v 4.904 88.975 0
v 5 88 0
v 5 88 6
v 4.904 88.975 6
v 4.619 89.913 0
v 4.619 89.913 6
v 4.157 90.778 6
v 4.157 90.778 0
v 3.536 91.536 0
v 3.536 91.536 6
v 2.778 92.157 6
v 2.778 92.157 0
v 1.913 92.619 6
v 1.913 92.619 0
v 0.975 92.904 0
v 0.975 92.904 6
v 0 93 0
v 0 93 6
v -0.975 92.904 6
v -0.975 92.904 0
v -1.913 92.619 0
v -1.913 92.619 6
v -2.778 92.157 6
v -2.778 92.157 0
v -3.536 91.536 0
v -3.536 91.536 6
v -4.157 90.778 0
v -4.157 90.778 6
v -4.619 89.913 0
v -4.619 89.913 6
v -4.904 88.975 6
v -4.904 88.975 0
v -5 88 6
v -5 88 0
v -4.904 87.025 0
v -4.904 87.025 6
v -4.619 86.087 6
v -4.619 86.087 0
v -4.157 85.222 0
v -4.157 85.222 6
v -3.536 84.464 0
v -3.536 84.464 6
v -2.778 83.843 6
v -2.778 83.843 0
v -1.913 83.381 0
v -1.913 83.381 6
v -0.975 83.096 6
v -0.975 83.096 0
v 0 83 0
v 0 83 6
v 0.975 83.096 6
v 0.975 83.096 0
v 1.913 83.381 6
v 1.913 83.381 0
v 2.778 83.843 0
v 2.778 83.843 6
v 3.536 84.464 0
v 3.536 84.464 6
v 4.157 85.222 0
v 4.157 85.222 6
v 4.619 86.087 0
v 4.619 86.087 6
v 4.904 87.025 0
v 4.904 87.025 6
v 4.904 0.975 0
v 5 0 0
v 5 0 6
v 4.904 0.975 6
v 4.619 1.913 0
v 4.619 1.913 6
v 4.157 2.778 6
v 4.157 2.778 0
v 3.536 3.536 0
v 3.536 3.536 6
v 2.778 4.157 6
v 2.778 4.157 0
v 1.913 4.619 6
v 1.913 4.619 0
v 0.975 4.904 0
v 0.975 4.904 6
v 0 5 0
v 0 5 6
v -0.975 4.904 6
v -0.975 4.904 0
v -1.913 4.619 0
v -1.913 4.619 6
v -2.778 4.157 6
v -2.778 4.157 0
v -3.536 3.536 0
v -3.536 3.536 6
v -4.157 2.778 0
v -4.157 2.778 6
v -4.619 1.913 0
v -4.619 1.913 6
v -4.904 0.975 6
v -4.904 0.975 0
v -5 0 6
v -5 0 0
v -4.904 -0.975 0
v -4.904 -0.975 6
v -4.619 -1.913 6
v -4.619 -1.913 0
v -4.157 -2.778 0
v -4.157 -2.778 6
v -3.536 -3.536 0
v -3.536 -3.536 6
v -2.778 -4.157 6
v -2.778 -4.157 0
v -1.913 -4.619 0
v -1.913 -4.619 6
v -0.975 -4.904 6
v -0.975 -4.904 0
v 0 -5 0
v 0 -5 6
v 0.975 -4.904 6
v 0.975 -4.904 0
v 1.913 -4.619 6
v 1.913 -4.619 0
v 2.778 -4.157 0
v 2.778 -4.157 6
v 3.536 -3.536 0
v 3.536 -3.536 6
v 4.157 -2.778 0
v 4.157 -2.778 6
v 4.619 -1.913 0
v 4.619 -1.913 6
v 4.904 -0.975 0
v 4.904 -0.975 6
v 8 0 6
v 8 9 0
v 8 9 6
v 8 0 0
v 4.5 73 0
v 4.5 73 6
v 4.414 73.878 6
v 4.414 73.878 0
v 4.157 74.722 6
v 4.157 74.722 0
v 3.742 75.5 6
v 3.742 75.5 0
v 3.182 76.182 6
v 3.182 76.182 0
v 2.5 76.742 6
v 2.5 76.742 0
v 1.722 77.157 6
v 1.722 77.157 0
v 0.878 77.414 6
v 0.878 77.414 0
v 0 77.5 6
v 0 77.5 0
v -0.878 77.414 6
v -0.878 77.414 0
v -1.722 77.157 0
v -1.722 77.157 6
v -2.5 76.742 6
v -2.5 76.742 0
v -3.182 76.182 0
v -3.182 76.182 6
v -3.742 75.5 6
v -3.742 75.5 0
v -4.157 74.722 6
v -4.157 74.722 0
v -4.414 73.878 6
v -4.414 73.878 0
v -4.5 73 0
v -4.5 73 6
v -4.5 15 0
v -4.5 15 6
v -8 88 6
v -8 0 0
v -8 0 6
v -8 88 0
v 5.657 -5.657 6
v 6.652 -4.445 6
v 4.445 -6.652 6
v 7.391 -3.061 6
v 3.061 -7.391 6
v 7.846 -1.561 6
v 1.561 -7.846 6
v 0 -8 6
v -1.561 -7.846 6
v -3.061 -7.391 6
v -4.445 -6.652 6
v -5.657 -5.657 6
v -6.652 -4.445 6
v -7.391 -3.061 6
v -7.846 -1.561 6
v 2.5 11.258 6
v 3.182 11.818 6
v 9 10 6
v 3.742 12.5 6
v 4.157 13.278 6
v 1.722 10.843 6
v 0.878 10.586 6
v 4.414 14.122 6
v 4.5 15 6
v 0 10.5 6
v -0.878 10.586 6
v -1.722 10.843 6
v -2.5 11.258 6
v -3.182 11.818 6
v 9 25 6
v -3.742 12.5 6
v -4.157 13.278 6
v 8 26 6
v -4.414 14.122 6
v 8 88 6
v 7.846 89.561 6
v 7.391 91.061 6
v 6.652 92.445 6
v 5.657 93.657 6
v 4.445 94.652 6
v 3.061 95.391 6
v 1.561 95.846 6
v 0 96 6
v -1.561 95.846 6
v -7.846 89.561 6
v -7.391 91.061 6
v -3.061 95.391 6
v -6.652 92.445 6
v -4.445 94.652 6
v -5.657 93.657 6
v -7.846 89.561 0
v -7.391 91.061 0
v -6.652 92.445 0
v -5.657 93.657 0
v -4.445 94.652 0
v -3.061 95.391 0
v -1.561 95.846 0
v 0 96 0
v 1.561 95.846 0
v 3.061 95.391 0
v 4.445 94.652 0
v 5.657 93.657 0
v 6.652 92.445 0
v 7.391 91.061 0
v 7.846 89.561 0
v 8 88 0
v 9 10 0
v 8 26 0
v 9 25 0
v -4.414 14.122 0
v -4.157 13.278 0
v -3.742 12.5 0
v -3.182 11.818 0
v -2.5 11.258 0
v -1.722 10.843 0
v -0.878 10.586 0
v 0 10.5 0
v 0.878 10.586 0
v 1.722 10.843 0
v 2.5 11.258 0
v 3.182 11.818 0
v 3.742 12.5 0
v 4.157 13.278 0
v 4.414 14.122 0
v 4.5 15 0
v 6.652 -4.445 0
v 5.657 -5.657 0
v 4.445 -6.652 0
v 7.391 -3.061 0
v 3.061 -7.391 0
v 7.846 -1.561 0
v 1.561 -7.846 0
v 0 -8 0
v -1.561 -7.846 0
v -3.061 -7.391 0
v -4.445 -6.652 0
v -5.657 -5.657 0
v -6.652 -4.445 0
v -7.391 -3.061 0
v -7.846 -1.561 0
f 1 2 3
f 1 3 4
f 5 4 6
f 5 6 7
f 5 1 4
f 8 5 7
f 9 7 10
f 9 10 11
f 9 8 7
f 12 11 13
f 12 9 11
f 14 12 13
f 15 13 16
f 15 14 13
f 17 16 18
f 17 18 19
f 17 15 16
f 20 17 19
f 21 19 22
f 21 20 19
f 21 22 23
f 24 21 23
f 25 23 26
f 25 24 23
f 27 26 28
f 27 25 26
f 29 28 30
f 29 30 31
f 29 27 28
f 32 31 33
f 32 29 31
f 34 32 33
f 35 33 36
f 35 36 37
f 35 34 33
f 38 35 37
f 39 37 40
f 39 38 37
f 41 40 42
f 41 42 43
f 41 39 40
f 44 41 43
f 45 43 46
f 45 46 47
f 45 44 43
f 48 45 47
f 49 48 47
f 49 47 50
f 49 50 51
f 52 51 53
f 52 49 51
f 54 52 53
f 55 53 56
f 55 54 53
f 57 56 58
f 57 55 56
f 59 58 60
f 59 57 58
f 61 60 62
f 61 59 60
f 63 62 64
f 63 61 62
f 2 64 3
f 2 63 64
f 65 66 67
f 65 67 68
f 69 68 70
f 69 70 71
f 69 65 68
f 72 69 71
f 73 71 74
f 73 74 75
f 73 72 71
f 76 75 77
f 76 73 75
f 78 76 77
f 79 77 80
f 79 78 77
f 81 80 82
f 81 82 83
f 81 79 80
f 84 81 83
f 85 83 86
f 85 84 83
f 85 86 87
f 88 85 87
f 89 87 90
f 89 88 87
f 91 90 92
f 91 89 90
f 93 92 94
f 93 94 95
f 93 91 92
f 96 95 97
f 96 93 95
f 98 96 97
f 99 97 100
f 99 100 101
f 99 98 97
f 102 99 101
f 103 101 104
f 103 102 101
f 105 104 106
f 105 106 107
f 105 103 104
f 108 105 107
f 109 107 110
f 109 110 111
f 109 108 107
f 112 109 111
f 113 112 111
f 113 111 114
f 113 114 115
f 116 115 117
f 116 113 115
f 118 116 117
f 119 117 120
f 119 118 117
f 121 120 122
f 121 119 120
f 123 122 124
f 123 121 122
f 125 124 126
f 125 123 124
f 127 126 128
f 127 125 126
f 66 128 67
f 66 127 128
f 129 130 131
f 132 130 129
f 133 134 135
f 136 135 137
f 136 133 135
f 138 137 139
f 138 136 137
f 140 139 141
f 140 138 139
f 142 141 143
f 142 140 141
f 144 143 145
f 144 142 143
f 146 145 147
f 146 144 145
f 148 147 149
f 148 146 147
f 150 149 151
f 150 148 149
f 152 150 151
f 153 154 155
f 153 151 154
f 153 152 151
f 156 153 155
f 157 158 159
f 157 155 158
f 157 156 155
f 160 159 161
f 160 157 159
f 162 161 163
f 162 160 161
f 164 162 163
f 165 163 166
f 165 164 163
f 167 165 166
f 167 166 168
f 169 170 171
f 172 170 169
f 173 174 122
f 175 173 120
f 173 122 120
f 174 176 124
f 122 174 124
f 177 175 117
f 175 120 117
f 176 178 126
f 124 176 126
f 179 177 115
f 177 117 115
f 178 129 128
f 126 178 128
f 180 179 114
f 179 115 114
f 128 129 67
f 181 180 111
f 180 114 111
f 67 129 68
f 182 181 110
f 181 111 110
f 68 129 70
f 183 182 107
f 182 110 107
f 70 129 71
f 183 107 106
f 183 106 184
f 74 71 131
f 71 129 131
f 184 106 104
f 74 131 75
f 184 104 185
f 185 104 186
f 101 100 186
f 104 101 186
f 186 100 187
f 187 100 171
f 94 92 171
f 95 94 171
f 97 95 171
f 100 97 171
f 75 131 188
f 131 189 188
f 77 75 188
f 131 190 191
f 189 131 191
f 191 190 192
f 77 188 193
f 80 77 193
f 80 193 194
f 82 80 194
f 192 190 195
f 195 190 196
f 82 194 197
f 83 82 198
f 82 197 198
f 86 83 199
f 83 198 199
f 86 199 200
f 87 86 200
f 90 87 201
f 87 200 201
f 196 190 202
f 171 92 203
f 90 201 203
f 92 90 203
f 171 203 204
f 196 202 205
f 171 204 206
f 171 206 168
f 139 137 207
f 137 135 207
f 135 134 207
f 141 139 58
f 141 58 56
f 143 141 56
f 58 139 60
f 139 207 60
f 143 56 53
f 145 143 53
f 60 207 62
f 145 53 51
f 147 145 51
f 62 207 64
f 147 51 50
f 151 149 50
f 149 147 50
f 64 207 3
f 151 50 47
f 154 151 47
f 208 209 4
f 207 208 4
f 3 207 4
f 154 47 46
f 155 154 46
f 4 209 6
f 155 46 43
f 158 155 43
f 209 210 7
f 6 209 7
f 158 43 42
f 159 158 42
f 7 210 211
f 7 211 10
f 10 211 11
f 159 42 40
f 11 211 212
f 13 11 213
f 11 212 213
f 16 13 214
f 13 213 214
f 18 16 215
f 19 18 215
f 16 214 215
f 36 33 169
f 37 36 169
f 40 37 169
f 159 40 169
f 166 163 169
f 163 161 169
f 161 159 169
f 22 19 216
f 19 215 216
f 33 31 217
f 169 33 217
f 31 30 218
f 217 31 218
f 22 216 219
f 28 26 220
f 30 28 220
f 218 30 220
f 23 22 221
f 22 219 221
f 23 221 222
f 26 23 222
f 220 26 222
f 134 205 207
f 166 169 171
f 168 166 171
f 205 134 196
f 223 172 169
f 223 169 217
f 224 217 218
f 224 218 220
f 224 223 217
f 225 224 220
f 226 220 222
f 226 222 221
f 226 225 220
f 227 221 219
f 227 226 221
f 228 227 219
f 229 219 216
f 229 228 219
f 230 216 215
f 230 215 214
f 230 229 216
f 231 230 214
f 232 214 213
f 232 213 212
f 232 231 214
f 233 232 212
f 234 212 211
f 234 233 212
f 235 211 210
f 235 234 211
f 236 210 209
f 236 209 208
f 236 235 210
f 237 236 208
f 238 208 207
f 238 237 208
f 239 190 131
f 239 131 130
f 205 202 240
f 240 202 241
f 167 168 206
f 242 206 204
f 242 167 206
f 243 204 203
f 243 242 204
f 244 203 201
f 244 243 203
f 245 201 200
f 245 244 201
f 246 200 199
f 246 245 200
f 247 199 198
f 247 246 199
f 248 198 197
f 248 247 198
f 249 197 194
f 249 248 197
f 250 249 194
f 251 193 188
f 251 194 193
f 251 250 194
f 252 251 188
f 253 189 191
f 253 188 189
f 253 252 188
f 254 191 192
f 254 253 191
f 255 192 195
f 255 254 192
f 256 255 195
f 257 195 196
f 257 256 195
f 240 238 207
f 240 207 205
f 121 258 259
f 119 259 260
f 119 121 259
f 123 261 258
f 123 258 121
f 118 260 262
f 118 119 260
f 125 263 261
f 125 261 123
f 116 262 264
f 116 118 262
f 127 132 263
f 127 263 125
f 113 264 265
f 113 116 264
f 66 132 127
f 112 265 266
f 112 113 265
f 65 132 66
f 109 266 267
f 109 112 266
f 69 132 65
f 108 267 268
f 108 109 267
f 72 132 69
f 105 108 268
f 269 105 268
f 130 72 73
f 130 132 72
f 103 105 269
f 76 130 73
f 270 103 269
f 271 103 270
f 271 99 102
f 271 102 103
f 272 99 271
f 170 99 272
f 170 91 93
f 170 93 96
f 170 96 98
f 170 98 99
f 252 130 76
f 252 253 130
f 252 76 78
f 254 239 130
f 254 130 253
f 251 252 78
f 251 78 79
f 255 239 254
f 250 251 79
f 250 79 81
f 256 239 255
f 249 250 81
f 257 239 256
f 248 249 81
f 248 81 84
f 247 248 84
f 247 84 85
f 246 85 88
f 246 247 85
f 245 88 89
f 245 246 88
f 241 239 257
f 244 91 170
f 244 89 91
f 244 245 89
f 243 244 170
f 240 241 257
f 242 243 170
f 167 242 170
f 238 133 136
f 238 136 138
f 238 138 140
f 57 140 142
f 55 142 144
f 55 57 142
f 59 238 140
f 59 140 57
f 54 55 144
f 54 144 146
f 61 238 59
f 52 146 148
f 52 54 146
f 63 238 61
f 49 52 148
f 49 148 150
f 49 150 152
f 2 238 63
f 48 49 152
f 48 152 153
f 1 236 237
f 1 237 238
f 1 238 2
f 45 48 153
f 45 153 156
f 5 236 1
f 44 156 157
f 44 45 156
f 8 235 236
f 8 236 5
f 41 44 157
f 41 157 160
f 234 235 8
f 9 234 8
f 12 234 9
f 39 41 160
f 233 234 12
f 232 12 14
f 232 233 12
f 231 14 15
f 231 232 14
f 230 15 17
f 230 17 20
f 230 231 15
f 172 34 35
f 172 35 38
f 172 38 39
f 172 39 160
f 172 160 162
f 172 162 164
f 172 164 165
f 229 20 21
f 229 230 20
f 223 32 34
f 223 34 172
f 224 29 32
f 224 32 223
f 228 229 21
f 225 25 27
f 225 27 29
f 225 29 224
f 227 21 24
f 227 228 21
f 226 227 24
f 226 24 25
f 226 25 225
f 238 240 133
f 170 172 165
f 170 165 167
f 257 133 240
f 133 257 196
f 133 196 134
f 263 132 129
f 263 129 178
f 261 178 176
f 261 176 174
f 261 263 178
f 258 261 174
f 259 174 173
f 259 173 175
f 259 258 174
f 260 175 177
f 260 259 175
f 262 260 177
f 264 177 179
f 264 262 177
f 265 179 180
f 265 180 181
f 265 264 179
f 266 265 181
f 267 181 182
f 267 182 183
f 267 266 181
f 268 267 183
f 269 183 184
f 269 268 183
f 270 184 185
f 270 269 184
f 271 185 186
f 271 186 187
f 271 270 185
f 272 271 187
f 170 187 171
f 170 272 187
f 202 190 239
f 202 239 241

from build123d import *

# Parameters (mm, degrees)
SKETCH_1_R          = 5
EXTRUDE_1_DEPTH     = 6
CUT_EXTRUDE_1_DEPTH = 10
SKETCH_3_W          = 1
SKETCH_3_H          = 15
EXTRUDE_2_DEPTH     = 6
CHAMFER_1_SIZE      = 1


with BuildPart() as part:
    # 草图1 → 凸台-拉伸1 (new body)
    with BuildSketch(Plane.XY):
        with BuildLine():
            Line((-8, 0), (-8, 88))
            ThreePointArc((-8, 88), (0, 96), (8, 88))
            Line((8, 88), (8, 0))
            ThreePointArc((8, 0), (0, -8), (-8, 0))
        make_face()
        with Locations((0, 88)):
            Circle(SKETCH_1_R, mode=Mode.SUBTRACT)
        Circle(SKETCH_1_R, mode=Mode.SUBTRACT)
    extrude(amount=EXTRUDE_1_DEPTH)

    # 草图2 → 切除-拉伸1 (cut)
    with BuildSketch(Plane(origin=(0, 0, 0), x_dir=(-1, 0, 0), z_dir=(0, 0, -1))):
        with BuildLine():
            Line((4.5, 73), (4.5, 15))
            ThreePointArc((4.5, 15), (0, 10.5), (-4.5, 15))
            Line((-4.5, 15), (-4.5, 73))
            ThreePointArc((-4.5, 73), (0, 77.5), (4.5, 73))
        make_face()
    extrude(amount=-CUT_EXTRUDE_1_DEPTH, mode=Mode.SUBTRACT)

    # 草图3 → 凸台-拉伸2 (add)
    with BuildSketch(Plane.XY.offset(6)):
        with Locations((8.5, 17.5)):
            Rectangle(SKETCH_3_W, SKETCH_3_H)
    extrude(amount=-EXTRUDE_2_DEPTH)

    # 倒角1
    chamfer_1_edges = [part.edges().sort_by_distance(p)[0] for p in [
        (8, 10, 3),
        (8, 25, 3),
    ]]
    chamfer(chamfer_1_edges, length=CHAMFER_1_SIZE - 0.0001)  # a hair under: the kernel refuses the full size


solid = part.part
